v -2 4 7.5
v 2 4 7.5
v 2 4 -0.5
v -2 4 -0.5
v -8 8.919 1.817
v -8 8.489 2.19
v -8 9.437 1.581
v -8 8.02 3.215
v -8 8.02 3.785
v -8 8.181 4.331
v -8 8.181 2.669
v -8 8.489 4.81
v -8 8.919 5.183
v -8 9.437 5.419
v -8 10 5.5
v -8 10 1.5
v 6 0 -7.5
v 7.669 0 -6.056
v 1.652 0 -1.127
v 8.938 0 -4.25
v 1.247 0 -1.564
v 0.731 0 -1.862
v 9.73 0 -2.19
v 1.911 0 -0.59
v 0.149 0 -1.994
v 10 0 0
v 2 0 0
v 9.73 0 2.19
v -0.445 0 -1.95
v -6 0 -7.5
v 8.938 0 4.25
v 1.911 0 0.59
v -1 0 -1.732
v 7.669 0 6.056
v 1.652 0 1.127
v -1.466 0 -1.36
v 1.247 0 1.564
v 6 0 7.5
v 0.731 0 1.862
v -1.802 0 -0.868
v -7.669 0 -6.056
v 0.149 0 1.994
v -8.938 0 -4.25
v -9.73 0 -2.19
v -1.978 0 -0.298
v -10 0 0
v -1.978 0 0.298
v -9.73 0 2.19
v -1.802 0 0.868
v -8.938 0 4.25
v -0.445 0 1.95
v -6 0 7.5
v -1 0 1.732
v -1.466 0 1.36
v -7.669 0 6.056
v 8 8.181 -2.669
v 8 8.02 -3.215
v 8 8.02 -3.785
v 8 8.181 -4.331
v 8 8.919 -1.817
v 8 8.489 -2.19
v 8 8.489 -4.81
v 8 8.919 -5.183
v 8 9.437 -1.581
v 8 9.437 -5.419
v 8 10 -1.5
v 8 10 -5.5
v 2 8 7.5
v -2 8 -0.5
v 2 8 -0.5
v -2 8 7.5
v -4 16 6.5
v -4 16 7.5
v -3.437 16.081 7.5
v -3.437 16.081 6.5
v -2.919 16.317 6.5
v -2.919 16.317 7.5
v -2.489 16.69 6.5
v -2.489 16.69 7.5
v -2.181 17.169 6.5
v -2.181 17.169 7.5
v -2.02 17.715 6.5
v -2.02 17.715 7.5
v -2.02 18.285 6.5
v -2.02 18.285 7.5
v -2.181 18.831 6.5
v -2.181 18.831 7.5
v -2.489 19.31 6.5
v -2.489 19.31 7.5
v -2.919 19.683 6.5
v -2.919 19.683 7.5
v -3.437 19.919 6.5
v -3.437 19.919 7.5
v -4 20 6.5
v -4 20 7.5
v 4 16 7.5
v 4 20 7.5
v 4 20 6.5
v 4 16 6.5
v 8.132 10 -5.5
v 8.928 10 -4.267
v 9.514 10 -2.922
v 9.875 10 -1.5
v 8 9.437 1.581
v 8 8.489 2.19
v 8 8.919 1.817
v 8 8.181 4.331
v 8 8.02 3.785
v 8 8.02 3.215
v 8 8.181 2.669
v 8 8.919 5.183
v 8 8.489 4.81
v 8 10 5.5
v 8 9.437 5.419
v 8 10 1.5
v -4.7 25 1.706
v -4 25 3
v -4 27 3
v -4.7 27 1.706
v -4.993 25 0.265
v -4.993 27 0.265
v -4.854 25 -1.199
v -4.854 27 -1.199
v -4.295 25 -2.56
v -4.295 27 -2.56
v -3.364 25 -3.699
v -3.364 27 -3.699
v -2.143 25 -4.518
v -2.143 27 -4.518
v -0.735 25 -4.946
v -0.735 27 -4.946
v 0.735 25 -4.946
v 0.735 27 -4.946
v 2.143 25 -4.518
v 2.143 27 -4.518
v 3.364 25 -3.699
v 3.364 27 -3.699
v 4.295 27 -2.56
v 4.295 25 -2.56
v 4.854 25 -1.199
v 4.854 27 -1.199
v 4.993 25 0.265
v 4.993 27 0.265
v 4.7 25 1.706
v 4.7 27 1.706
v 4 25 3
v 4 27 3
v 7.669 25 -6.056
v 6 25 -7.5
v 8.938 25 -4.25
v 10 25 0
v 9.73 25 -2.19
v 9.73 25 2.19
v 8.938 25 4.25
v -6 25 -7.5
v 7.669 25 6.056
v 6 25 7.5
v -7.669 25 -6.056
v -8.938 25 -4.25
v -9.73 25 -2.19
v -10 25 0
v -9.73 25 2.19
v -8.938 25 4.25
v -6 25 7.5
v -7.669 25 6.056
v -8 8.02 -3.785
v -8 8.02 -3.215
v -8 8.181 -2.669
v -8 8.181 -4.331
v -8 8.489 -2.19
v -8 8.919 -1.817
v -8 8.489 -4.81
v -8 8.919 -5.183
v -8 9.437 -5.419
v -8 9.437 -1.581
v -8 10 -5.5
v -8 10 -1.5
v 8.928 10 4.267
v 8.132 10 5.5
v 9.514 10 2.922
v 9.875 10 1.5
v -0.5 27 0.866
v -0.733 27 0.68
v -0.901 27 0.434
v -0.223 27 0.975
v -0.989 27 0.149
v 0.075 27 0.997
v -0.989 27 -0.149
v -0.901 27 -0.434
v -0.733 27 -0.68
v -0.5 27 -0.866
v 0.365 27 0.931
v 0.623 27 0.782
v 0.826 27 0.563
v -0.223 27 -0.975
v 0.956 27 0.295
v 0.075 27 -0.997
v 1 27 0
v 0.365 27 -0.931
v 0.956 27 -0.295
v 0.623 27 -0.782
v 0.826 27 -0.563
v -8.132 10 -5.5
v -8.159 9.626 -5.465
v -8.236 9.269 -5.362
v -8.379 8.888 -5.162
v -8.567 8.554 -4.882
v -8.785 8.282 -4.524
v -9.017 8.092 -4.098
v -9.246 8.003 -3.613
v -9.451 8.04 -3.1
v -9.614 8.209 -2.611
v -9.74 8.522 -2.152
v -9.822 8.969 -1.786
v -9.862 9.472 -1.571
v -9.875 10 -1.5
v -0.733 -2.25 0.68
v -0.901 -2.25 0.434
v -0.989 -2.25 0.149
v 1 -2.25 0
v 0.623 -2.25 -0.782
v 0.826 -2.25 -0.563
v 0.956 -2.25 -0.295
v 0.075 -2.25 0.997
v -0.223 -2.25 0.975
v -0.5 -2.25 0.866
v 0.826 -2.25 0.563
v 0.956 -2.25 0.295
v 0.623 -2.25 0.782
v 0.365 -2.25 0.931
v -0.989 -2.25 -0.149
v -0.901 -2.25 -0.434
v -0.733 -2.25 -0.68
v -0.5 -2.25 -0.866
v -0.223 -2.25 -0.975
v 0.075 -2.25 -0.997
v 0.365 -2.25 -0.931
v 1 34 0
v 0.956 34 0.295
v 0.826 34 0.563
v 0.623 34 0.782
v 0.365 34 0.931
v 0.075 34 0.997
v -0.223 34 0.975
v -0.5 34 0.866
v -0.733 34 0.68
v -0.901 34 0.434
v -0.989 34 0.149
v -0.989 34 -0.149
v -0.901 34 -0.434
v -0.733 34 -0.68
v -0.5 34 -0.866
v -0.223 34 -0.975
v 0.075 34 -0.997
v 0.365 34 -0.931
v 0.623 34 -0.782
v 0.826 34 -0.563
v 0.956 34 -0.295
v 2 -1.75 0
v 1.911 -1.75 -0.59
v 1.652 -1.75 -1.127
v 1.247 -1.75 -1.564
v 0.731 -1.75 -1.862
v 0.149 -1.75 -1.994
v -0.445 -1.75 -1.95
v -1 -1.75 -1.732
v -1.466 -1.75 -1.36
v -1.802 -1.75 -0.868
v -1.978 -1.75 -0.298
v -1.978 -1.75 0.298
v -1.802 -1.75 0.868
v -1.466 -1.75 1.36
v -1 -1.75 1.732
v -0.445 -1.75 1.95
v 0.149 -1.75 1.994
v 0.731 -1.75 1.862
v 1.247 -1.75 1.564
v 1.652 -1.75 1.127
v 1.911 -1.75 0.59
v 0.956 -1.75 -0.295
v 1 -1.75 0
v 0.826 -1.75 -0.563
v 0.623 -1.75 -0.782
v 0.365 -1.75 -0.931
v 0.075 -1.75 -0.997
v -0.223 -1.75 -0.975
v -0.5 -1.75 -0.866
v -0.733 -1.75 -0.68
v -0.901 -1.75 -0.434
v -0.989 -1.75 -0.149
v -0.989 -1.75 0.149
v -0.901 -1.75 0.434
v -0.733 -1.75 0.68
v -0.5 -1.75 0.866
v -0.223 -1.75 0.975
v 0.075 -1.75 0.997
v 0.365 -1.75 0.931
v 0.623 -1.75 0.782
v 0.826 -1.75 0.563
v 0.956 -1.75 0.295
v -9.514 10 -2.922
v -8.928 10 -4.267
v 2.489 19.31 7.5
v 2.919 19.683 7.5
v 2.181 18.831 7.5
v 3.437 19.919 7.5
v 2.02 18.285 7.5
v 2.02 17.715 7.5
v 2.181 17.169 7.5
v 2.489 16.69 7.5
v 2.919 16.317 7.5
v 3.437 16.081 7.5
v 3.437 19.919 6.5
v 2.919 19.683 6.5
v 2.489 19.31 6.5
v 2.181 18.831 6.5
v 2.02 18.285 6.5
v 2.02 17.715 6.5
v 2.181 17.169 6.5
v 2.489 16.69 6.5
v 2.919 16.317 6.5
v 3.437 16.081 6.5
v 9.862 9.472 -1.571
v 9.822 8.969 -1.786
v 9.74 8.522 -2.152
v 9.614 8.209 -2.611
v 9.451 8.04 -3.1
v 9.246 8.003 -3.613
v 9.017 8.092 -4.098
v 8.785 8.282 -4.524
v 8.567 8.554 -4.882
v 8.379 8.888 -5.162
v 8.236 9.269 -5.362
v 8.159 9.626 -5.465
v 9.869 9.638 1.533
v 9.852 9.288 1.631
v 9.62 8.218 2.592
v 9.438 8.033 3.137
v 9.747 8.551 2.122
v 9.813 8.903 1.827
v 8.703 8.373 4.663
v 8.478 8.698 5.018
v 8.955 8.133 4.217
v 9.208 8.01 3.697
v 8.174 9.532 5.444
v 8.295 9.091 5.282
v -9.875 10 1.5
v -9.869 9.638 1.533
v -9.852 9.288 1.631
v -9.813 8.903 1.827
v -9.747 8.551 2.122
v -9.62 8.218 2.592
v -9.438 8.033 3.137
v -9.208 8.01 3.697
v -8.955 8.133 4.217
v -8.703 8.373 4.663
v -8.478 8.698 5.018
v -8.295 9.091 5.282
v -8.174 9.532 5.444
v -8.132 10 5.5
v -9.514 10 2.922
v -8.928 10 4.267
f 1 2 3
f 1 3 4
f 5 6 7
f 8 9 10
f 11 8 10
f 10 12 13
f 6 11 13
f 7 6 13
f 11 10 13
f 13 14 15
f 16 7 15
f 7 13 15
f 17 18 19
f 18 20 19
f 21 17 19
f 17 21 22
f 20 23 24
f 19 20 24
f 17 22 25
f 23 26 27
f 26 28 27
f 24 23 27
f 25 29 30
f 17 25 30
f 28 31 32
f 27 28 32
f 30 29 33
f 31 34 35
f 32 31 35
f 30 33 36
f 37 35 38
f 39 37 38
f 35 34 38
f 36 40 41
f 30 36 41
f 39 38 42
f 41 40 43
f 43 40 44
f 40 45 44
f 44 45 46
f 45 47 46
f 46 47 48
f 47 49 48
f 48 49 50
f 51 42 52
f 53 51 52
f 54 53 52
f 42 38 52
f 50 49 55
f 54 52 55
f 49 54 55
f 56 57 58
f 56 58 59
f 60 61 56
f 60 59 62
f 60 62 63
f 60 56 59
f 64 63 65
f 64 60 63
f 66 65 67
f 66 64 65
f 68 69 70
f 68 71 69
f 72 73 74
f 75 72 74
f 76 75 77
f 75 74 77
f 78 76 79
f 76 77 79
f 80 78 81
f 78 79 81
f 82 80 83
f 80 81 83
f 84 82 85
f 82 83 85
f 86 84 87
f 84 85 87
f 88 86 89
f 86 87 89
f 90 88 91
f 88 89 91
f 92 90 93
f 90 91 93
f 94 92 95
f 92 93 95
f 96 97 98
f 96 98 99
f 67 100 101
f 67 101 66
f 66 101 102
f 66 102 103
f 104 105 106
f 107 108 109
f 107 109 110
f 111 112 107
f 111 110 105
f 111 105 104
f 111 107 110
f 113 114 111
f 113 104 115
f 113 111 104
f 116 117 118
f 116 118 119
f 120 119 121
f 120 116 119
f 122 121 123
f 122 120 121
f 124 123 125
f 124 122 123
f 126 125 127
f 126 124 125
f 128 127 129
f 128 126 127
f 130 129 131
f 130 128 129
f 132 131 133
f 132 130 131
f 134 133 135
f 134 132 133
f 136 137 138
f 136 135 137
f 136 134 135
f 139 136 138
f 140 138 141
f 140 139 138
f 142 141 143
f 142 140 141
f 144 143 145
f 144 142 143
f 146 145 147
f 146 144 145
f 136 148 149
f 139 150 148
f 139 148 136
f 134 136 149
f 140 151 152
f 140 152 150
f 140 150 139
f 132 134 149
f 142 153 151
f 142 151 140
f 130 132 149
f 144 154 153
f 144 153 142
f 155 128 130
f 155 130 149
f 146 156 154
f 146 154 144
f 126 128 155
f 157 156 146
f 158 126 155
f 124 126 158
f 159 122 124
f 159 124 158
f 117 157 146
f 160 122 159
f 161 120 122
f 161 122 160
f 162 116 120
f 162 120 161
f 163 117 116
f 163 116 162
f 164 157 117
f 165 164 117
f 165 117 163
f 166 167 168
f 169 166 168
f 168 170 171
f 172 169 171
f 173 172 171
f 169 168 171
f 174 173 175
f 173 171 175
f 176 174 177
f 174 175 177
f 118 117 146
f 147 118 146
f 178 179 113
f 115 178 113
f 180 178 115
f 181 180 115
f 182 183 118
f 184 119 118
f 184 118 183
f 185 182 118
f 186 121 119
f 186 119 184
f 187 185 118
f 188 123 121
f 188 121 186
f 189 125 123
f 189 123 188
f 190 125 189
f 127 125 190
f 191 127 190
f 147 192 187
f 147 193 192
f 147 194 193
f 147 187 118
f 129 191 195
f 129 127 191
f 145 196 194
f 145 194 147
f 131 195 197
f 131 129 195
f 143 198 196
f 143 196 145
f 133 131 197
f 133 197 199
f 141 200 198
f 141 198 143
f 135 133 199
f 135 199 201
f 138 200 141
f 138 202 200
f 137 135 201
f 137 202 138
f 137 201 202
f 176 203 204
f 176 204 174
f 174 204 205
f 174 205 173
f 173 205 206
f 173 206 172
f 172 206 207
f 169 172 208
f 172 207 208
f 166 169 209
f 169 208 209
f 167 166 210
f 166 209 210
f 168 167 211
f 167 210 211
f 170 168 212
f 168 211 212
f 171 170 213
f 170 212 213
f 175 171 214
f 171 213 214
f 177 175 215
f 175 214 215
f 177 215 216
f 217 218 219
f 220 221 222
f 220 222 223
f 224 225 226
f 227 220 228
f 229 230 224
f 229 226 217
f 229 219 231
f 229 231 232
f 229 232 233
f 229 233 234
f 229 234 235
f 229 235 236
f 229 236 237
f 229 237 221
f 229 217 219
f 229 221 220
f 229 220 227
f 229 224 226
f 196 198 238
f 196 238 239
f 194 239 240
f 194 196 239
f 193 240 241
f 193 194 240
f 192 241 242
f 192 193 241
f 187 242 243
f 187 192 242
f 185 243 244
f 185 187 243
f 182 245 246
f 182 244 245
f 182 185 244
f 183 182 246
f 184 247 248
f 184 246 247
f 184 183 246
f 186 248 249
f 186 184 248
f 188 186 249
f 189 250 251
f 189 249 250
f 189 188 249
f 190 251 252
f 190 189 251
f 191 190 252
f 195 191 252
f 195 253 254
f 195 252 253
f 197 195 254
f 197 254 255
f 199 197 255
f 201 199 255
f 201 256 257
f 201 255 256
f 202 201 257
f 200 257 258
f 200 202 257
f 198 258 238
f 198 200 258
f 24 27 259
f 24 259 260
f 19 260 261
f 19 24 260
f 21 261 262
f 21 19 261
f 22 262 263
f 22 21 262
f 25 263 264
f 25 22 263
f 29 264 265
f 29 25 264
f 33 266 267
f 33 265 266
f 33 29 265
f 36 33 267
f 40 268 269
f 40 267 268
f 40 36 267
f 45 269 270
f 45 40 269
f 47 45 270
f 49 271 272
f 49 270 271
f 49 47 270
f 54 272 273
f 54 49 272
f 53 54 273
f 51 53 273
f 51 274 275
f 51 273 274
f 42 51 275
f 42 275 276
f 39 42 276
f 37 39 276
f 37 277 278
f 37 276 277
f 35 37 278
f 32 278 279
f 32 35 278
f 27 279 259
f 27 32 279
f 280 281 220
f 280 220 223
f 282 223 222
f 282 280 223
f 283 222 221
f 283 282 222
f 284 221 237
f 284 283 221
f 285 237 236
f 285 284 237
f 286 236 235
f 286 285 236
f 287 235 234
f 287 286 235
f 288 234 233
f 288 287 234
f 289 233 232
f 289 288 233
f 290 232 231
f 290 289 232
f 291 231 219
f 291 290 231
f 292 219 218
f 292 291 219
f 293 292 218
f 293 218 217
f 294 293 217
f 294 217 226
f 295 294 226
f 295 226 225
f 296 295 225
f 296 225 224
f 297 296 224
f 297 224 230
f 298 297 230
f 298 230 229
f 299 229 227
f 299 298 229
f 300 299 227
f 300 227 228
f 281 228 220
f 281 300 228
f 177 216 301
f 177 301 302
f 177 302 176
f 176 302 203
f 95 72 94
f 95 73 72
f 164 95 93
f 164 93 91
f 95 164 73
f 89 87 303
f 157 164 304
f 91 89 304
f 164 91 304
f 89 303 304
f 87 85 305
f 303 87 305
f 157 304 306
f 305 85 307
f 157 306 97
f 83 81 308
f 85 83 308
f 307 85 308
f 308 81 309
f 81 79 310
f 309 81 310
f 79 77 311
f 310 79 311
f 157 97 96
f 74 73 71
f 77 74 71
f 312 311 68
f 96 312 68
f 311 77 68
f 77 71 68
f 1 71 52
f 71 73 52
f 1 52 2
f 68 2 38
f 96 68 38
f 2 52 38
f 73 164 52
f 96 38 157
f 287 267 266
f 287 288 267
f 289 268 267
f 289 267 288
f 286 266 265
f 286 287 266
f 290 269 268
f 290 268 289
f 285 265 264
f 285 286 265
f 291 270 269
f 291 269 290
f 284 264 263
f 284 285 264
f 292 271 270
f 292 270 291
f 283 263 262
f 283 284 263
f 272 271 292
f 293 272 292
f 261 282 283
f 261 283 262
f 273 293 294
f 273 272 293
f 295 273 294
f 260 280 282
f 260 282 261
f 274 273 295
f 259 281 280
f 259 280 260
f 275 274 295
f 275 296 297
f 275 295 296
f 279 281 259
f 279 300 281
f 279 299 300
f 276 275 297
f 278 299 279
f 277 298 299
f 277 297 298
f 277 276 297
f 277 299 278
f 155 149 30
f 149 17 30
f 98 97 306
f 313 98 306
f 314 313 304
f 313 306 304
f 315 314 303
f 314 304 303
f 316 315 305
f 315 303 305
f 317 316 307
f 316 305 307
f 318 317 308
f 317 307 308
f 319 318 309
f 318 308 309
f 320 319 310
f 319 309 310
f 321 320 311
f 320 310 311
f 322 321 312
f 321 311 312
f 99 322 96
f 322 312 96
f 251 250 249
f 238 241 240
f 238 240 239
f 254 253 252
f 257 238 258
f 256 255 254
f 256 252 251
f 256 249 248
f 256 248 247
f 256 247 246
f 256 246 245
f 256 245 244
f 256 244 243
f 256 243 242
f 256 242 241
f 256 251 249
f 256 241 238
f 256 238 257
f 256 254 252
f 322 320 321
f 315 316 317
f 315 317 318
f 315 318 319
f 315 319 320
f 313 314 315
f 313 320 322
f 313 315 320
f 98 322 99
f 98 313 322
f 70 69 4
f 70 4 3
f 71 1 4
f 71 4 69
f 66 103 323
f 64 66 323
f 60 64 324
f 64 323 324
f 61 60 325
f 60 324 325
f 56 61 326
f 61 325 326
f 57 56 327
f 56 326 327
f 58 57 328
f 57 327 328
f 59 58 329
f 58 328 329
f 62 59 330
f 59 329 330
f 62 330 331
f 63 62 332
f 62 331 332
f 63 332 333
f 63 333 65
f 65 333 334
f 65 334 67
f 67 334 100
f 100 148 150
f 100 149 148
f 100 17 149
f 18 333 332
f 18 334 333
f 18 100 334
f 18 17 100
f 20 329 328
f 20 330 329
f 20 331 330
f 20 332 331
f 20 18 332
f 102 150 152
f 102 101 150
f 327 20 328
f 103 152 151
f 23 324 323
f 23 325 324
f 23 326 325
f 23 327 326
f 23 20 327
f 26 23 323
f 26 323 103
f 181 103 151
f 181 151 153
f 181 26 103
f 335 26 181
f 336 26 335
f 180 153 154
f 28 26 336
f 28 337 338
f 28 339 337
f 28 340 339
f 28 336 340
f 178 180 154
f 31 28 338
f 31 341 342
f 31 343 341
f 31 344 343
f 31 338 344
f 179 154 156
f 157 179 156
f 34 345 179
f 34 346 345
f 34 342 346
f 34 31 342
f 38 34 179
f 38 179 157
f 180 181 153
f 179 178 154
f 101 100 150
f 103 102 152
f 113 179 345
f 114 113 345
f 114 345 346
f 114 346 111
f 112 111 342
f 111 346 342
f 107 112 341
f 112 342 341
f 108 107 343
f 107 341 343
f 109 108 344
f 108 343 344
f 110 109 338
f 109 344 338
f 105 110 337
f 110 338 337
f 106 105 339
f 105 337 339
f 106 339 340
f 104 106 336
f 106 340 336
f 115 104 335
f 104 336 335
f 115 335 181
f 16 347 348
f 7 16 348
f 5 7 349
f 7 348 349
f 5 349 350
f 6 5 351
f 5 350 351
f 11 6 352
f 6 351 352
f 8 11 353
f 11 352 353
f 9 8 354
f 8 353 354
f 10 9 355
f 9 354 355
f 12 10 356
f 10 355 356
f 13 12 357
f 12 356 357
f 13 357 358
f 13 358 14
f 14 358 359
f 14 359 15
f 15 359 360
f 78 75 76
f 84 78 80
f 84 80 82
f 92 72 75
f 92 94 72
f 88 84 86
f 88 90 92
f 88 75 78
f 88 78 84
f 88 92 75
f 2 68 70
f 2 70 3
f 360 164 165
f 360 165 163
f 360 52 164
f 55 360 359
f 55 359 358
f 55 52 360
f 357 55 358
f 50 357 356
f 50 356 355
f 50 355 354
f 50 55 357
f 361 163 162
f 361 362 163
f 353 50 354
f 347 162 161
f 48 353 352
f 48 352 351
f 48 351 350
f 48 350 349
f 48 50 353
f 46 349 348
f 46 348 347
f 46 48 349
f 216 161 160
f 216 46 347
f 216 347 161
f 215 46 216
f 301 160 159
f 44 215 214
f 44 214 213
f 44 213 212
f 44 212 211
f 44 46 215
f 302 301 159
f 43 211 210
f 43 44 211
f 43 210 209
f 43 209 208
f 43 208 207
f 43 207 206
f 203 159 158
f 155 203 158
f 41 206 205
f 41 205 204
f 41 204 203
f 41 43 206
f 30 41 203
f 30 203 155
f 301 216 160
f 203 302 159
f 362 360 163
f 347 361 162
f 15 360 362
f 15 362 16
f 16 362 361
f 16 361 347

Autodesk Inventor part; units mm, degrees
ref_plane "XZ Plane" through (0, 0, 0) normal (0, 1, 0) x (-1, 0, 0)
ref_plane "XY Plane" through (0, 0, 0) normal (0, 0, 1) x (1, 0, 0)
sketch "Boceto1" plane through (0, 0, 0) normal (0, 1, 0) x (-1, 0, 0)
  line L0 (10, 7.5) -> (-10, 7.5)
  line L1 (-10, 7.5) -> (-10, -7.5)
  line L2 (-10, -7.5) -> (10, -7.5)
  line L3 (10, -7.5) -> (10, 7.5)
  arc A0 (6, -7.5) -> (6, 7.5) centre (0.9688, 0) ccw
  arc A1 (-6, 7.5) -> (-6, -7.5) centre (-0.9688, 0) ccw
  point P0 (0, 0)
  point P1 (-10, 0)
  point P2 (0, -7.5)
  dimension "d0" = 20
  dimension "d1" = 15
  dimension "d2" = 4
  dimension "d3" = 4
  dimension "d4" = 4
  dimension "d5" = 4
extrude "Extrusión1" add sketch "Boceto1" along normal blind 25 contours A0 L2 A1 L0
sketch "Boceto2" plane through (0, 25, 0) normal (0, 1, 0) x (1, 0, 0)
  line L0 (-6, -7.5) -> (6, -7.5) projected
  arc A0 (6, -7.5) -> (6, 7.5) centre (0.9688, 0) ccw projected
  line L1 (6, 7.5) -> (-6, 7.5) projected
  arc A1 (-6, 7.5) -> (-6, -7.5) centre (-0.9688, 0) ccw projected
  arc A2 (4, -3) -> (-4, -3) centre (0, 0) ccw
  line L2 (0, 0) -> (0, -3)
  line L3 (0, -3) -> (-4, -3)
  line L4 (0, -3) -> (4, -3)
  dimension "d8" = 10
  dimension "d9" = 3
extrude "Extrusión2" add sketch "Boceto2" along normal blind 2 contours L4 L3 A2
sketch "Boceto3" plane through (0, 27, 0) normal (0, 1, 0) x (1, 0, 0)
  line L0 (-4, -3) -> (4, -3) projected
  arc A0 (4, -3) -> (-4, -3) centre (0, 0) ccw projected
  circle A1 centre (0, 0) radius 1
  dimension "d12" = 2
extrude "Extrusión3" add sketch "Boceto3" along normal blind 7 contours A1
sketch "Boceto4" plane through (-6, 0, 7.5) normal (0, 0, 1) x (1, 0, 0)
  line L0 (0, 0) -> (12, 0) projected
  line L1 (12, 0) -> (12, 25) projected
  line L2 (0, 25) -> (12, 25) projected
  line L3 (0, 0) -> (0, 25) projected
  line L4 (4, 8) -> (8, 8)
  line L5 (8, 8) -> (8, 4)
  line L6 (8, 4) -> (4, 4)
  line L7 (4, 4) -> (4, 8)
  arc A0 (10, 20) -> (10, 16) centre (10, 18) ccw
  line L8 (10, 20) -> (10, 16) construction
  line L9 (10, 20) -> (14, 20) construction
  arc A1 (2, 16) -> (2, 20) centre (2, 18) ccw
  line L10 (2, 20) -> (2, 16) construction
  line L11 (2, 20) -> (6, 20) construction
  line L12 (10, 20) -> (10, 16)
  line L13 (2, 16) -> (2, 20)
  point P0 (6, 0)
  point P1 (6, 4)
  point P2 (6, 0)
  dimension "d15" = 4
  dimension "d16" = 4
  dimension "d17" = 8
  dimension "d18" = 4
  dimension "d19" = 90
  dimension "d20" = 2
  dimension "d21" = 20
  dimension "d22" = 2
  dimension "d23" = 4
  dimension "d24" = 90
  dimension "d25" = 2
  dimension "d26" = 20
  dimension "d27" = 2
extrude "Extrusión4" cut sketch "Boceto4" against normal blind 1 contours L12 A0 | L13 A1
extrude "Extrusión5" cut sketch "Boceto4" against normal blind 8 contours L4 L5 L6 L7
ref_plane "Plano de trabajo1" through (10, 0, 0) normal (1, 0, 0) x (0, 1, 0)
sketch "Boceto5" plane through (10, 0, 0) normal (1, 0, 0) x (0, 1, 0)
  line L0 (0, 7.5) -> (0, -7.5) projected
  line L1 (0, -7.5) -> (25, -7.5) projected
  line L2 (25, 7.5) -> (25, -7.5) projected
  line L3 (0, 7.5) -> (25, 7.5) projected
  arc A0 (10, 5.5) -> (10, 1.5) centre (10, 3.5) ccw
  line L4 (10, 5.5) -> (10, 1.5)
  arc A1 (10, -1.5) -> (10, -5.5) centre (10, -3.5) ccw
  line L5 (10, -5.5) -> (10, -1.5)
  point P0 (0, 0)
  dimension "d32" = 4
  dimension "d33" = 2
  dimension "d34" = 10
  dimension "d35" = 2
  dimension "d36" = 4
  dimension "d37" = 2
  dimension "d38" = 10
  dimension "d39" = 2
extrude "Extrusión6" cut sketch "Boceto5" against normal blind 2 contours L4 A0 | L5 A1
ref_plane "Plano de trabajo2" through (-10, 0, 0) normal (1, 0, 0) x (0, 1, 0)
sketch "Boceto6" plane through (-10, 0, 0) normal (1, 0, 0) x (0, 1, 0)
  line L0 (0, -7.5) -> (0, 7.5) projected
  line L1 (0, 7.5) -> (25, 7.5) projected
  line L2 (25, -7.5) -> (25, 7.5) projected
  line L3 (0, -7.5) -> (25, -7.5) projected
  arc A0 (10, -1.5) -> (10, -5.5) centre (10, -3.5) ccw projected
  line L4 (10, -1.5) -> (10, -5.5) projected
  line L5 (10, -5.5) -> (10, -1.5)
  arc A1 (10, 5.5) -> (10, 1.5) centre (10, 3.5) ccw projected
  line L6 (10, 5.5) -> (10, 1.5) projected
  line L7 (10, 5.5) -> (10, 1.5)
  point P0 (0, 0)
extrude "Extrusión7" cut sketch "Boceto6" along normal blind 2 contours L4 A0 | L6 A1
sketch "Boceto7" plane through (0, 0, 0) normal (0, -1, 0) x (1, 0, 0)
  line L0 (-6, 7.5) -> (6, 7.5) projected
  arc A0 (-6, 7.5) -> (-6, -7.5) centre (-0.9688, 0) ccw projected
  line L1 (6, -7.5) -> (-6, -7.5) projected
  arc A1 (6, -7.5) -> (6, 7.5) centre (0.9688, 0) ccw projected
  circle A2 centre (0, 0) radius 2
  dimension "d44" = 4
extrude "Extrusión8" add sketch "Boceto7" along normal blind 1.75 contours A2
sketch "Boceto8" plane through (0, -1.75, 0) normal (0, -1, 0) x (1, 0, 0)
  circle A0 centre (0, 0) radius 2 projected
  circle A1 centre (0, 0) radius 1
extrude "Extrusión9" add sketch "Boceto8" along normal blind 0.5 contours A1
properties part number "Motor" material "Aluminio 6061-O"
